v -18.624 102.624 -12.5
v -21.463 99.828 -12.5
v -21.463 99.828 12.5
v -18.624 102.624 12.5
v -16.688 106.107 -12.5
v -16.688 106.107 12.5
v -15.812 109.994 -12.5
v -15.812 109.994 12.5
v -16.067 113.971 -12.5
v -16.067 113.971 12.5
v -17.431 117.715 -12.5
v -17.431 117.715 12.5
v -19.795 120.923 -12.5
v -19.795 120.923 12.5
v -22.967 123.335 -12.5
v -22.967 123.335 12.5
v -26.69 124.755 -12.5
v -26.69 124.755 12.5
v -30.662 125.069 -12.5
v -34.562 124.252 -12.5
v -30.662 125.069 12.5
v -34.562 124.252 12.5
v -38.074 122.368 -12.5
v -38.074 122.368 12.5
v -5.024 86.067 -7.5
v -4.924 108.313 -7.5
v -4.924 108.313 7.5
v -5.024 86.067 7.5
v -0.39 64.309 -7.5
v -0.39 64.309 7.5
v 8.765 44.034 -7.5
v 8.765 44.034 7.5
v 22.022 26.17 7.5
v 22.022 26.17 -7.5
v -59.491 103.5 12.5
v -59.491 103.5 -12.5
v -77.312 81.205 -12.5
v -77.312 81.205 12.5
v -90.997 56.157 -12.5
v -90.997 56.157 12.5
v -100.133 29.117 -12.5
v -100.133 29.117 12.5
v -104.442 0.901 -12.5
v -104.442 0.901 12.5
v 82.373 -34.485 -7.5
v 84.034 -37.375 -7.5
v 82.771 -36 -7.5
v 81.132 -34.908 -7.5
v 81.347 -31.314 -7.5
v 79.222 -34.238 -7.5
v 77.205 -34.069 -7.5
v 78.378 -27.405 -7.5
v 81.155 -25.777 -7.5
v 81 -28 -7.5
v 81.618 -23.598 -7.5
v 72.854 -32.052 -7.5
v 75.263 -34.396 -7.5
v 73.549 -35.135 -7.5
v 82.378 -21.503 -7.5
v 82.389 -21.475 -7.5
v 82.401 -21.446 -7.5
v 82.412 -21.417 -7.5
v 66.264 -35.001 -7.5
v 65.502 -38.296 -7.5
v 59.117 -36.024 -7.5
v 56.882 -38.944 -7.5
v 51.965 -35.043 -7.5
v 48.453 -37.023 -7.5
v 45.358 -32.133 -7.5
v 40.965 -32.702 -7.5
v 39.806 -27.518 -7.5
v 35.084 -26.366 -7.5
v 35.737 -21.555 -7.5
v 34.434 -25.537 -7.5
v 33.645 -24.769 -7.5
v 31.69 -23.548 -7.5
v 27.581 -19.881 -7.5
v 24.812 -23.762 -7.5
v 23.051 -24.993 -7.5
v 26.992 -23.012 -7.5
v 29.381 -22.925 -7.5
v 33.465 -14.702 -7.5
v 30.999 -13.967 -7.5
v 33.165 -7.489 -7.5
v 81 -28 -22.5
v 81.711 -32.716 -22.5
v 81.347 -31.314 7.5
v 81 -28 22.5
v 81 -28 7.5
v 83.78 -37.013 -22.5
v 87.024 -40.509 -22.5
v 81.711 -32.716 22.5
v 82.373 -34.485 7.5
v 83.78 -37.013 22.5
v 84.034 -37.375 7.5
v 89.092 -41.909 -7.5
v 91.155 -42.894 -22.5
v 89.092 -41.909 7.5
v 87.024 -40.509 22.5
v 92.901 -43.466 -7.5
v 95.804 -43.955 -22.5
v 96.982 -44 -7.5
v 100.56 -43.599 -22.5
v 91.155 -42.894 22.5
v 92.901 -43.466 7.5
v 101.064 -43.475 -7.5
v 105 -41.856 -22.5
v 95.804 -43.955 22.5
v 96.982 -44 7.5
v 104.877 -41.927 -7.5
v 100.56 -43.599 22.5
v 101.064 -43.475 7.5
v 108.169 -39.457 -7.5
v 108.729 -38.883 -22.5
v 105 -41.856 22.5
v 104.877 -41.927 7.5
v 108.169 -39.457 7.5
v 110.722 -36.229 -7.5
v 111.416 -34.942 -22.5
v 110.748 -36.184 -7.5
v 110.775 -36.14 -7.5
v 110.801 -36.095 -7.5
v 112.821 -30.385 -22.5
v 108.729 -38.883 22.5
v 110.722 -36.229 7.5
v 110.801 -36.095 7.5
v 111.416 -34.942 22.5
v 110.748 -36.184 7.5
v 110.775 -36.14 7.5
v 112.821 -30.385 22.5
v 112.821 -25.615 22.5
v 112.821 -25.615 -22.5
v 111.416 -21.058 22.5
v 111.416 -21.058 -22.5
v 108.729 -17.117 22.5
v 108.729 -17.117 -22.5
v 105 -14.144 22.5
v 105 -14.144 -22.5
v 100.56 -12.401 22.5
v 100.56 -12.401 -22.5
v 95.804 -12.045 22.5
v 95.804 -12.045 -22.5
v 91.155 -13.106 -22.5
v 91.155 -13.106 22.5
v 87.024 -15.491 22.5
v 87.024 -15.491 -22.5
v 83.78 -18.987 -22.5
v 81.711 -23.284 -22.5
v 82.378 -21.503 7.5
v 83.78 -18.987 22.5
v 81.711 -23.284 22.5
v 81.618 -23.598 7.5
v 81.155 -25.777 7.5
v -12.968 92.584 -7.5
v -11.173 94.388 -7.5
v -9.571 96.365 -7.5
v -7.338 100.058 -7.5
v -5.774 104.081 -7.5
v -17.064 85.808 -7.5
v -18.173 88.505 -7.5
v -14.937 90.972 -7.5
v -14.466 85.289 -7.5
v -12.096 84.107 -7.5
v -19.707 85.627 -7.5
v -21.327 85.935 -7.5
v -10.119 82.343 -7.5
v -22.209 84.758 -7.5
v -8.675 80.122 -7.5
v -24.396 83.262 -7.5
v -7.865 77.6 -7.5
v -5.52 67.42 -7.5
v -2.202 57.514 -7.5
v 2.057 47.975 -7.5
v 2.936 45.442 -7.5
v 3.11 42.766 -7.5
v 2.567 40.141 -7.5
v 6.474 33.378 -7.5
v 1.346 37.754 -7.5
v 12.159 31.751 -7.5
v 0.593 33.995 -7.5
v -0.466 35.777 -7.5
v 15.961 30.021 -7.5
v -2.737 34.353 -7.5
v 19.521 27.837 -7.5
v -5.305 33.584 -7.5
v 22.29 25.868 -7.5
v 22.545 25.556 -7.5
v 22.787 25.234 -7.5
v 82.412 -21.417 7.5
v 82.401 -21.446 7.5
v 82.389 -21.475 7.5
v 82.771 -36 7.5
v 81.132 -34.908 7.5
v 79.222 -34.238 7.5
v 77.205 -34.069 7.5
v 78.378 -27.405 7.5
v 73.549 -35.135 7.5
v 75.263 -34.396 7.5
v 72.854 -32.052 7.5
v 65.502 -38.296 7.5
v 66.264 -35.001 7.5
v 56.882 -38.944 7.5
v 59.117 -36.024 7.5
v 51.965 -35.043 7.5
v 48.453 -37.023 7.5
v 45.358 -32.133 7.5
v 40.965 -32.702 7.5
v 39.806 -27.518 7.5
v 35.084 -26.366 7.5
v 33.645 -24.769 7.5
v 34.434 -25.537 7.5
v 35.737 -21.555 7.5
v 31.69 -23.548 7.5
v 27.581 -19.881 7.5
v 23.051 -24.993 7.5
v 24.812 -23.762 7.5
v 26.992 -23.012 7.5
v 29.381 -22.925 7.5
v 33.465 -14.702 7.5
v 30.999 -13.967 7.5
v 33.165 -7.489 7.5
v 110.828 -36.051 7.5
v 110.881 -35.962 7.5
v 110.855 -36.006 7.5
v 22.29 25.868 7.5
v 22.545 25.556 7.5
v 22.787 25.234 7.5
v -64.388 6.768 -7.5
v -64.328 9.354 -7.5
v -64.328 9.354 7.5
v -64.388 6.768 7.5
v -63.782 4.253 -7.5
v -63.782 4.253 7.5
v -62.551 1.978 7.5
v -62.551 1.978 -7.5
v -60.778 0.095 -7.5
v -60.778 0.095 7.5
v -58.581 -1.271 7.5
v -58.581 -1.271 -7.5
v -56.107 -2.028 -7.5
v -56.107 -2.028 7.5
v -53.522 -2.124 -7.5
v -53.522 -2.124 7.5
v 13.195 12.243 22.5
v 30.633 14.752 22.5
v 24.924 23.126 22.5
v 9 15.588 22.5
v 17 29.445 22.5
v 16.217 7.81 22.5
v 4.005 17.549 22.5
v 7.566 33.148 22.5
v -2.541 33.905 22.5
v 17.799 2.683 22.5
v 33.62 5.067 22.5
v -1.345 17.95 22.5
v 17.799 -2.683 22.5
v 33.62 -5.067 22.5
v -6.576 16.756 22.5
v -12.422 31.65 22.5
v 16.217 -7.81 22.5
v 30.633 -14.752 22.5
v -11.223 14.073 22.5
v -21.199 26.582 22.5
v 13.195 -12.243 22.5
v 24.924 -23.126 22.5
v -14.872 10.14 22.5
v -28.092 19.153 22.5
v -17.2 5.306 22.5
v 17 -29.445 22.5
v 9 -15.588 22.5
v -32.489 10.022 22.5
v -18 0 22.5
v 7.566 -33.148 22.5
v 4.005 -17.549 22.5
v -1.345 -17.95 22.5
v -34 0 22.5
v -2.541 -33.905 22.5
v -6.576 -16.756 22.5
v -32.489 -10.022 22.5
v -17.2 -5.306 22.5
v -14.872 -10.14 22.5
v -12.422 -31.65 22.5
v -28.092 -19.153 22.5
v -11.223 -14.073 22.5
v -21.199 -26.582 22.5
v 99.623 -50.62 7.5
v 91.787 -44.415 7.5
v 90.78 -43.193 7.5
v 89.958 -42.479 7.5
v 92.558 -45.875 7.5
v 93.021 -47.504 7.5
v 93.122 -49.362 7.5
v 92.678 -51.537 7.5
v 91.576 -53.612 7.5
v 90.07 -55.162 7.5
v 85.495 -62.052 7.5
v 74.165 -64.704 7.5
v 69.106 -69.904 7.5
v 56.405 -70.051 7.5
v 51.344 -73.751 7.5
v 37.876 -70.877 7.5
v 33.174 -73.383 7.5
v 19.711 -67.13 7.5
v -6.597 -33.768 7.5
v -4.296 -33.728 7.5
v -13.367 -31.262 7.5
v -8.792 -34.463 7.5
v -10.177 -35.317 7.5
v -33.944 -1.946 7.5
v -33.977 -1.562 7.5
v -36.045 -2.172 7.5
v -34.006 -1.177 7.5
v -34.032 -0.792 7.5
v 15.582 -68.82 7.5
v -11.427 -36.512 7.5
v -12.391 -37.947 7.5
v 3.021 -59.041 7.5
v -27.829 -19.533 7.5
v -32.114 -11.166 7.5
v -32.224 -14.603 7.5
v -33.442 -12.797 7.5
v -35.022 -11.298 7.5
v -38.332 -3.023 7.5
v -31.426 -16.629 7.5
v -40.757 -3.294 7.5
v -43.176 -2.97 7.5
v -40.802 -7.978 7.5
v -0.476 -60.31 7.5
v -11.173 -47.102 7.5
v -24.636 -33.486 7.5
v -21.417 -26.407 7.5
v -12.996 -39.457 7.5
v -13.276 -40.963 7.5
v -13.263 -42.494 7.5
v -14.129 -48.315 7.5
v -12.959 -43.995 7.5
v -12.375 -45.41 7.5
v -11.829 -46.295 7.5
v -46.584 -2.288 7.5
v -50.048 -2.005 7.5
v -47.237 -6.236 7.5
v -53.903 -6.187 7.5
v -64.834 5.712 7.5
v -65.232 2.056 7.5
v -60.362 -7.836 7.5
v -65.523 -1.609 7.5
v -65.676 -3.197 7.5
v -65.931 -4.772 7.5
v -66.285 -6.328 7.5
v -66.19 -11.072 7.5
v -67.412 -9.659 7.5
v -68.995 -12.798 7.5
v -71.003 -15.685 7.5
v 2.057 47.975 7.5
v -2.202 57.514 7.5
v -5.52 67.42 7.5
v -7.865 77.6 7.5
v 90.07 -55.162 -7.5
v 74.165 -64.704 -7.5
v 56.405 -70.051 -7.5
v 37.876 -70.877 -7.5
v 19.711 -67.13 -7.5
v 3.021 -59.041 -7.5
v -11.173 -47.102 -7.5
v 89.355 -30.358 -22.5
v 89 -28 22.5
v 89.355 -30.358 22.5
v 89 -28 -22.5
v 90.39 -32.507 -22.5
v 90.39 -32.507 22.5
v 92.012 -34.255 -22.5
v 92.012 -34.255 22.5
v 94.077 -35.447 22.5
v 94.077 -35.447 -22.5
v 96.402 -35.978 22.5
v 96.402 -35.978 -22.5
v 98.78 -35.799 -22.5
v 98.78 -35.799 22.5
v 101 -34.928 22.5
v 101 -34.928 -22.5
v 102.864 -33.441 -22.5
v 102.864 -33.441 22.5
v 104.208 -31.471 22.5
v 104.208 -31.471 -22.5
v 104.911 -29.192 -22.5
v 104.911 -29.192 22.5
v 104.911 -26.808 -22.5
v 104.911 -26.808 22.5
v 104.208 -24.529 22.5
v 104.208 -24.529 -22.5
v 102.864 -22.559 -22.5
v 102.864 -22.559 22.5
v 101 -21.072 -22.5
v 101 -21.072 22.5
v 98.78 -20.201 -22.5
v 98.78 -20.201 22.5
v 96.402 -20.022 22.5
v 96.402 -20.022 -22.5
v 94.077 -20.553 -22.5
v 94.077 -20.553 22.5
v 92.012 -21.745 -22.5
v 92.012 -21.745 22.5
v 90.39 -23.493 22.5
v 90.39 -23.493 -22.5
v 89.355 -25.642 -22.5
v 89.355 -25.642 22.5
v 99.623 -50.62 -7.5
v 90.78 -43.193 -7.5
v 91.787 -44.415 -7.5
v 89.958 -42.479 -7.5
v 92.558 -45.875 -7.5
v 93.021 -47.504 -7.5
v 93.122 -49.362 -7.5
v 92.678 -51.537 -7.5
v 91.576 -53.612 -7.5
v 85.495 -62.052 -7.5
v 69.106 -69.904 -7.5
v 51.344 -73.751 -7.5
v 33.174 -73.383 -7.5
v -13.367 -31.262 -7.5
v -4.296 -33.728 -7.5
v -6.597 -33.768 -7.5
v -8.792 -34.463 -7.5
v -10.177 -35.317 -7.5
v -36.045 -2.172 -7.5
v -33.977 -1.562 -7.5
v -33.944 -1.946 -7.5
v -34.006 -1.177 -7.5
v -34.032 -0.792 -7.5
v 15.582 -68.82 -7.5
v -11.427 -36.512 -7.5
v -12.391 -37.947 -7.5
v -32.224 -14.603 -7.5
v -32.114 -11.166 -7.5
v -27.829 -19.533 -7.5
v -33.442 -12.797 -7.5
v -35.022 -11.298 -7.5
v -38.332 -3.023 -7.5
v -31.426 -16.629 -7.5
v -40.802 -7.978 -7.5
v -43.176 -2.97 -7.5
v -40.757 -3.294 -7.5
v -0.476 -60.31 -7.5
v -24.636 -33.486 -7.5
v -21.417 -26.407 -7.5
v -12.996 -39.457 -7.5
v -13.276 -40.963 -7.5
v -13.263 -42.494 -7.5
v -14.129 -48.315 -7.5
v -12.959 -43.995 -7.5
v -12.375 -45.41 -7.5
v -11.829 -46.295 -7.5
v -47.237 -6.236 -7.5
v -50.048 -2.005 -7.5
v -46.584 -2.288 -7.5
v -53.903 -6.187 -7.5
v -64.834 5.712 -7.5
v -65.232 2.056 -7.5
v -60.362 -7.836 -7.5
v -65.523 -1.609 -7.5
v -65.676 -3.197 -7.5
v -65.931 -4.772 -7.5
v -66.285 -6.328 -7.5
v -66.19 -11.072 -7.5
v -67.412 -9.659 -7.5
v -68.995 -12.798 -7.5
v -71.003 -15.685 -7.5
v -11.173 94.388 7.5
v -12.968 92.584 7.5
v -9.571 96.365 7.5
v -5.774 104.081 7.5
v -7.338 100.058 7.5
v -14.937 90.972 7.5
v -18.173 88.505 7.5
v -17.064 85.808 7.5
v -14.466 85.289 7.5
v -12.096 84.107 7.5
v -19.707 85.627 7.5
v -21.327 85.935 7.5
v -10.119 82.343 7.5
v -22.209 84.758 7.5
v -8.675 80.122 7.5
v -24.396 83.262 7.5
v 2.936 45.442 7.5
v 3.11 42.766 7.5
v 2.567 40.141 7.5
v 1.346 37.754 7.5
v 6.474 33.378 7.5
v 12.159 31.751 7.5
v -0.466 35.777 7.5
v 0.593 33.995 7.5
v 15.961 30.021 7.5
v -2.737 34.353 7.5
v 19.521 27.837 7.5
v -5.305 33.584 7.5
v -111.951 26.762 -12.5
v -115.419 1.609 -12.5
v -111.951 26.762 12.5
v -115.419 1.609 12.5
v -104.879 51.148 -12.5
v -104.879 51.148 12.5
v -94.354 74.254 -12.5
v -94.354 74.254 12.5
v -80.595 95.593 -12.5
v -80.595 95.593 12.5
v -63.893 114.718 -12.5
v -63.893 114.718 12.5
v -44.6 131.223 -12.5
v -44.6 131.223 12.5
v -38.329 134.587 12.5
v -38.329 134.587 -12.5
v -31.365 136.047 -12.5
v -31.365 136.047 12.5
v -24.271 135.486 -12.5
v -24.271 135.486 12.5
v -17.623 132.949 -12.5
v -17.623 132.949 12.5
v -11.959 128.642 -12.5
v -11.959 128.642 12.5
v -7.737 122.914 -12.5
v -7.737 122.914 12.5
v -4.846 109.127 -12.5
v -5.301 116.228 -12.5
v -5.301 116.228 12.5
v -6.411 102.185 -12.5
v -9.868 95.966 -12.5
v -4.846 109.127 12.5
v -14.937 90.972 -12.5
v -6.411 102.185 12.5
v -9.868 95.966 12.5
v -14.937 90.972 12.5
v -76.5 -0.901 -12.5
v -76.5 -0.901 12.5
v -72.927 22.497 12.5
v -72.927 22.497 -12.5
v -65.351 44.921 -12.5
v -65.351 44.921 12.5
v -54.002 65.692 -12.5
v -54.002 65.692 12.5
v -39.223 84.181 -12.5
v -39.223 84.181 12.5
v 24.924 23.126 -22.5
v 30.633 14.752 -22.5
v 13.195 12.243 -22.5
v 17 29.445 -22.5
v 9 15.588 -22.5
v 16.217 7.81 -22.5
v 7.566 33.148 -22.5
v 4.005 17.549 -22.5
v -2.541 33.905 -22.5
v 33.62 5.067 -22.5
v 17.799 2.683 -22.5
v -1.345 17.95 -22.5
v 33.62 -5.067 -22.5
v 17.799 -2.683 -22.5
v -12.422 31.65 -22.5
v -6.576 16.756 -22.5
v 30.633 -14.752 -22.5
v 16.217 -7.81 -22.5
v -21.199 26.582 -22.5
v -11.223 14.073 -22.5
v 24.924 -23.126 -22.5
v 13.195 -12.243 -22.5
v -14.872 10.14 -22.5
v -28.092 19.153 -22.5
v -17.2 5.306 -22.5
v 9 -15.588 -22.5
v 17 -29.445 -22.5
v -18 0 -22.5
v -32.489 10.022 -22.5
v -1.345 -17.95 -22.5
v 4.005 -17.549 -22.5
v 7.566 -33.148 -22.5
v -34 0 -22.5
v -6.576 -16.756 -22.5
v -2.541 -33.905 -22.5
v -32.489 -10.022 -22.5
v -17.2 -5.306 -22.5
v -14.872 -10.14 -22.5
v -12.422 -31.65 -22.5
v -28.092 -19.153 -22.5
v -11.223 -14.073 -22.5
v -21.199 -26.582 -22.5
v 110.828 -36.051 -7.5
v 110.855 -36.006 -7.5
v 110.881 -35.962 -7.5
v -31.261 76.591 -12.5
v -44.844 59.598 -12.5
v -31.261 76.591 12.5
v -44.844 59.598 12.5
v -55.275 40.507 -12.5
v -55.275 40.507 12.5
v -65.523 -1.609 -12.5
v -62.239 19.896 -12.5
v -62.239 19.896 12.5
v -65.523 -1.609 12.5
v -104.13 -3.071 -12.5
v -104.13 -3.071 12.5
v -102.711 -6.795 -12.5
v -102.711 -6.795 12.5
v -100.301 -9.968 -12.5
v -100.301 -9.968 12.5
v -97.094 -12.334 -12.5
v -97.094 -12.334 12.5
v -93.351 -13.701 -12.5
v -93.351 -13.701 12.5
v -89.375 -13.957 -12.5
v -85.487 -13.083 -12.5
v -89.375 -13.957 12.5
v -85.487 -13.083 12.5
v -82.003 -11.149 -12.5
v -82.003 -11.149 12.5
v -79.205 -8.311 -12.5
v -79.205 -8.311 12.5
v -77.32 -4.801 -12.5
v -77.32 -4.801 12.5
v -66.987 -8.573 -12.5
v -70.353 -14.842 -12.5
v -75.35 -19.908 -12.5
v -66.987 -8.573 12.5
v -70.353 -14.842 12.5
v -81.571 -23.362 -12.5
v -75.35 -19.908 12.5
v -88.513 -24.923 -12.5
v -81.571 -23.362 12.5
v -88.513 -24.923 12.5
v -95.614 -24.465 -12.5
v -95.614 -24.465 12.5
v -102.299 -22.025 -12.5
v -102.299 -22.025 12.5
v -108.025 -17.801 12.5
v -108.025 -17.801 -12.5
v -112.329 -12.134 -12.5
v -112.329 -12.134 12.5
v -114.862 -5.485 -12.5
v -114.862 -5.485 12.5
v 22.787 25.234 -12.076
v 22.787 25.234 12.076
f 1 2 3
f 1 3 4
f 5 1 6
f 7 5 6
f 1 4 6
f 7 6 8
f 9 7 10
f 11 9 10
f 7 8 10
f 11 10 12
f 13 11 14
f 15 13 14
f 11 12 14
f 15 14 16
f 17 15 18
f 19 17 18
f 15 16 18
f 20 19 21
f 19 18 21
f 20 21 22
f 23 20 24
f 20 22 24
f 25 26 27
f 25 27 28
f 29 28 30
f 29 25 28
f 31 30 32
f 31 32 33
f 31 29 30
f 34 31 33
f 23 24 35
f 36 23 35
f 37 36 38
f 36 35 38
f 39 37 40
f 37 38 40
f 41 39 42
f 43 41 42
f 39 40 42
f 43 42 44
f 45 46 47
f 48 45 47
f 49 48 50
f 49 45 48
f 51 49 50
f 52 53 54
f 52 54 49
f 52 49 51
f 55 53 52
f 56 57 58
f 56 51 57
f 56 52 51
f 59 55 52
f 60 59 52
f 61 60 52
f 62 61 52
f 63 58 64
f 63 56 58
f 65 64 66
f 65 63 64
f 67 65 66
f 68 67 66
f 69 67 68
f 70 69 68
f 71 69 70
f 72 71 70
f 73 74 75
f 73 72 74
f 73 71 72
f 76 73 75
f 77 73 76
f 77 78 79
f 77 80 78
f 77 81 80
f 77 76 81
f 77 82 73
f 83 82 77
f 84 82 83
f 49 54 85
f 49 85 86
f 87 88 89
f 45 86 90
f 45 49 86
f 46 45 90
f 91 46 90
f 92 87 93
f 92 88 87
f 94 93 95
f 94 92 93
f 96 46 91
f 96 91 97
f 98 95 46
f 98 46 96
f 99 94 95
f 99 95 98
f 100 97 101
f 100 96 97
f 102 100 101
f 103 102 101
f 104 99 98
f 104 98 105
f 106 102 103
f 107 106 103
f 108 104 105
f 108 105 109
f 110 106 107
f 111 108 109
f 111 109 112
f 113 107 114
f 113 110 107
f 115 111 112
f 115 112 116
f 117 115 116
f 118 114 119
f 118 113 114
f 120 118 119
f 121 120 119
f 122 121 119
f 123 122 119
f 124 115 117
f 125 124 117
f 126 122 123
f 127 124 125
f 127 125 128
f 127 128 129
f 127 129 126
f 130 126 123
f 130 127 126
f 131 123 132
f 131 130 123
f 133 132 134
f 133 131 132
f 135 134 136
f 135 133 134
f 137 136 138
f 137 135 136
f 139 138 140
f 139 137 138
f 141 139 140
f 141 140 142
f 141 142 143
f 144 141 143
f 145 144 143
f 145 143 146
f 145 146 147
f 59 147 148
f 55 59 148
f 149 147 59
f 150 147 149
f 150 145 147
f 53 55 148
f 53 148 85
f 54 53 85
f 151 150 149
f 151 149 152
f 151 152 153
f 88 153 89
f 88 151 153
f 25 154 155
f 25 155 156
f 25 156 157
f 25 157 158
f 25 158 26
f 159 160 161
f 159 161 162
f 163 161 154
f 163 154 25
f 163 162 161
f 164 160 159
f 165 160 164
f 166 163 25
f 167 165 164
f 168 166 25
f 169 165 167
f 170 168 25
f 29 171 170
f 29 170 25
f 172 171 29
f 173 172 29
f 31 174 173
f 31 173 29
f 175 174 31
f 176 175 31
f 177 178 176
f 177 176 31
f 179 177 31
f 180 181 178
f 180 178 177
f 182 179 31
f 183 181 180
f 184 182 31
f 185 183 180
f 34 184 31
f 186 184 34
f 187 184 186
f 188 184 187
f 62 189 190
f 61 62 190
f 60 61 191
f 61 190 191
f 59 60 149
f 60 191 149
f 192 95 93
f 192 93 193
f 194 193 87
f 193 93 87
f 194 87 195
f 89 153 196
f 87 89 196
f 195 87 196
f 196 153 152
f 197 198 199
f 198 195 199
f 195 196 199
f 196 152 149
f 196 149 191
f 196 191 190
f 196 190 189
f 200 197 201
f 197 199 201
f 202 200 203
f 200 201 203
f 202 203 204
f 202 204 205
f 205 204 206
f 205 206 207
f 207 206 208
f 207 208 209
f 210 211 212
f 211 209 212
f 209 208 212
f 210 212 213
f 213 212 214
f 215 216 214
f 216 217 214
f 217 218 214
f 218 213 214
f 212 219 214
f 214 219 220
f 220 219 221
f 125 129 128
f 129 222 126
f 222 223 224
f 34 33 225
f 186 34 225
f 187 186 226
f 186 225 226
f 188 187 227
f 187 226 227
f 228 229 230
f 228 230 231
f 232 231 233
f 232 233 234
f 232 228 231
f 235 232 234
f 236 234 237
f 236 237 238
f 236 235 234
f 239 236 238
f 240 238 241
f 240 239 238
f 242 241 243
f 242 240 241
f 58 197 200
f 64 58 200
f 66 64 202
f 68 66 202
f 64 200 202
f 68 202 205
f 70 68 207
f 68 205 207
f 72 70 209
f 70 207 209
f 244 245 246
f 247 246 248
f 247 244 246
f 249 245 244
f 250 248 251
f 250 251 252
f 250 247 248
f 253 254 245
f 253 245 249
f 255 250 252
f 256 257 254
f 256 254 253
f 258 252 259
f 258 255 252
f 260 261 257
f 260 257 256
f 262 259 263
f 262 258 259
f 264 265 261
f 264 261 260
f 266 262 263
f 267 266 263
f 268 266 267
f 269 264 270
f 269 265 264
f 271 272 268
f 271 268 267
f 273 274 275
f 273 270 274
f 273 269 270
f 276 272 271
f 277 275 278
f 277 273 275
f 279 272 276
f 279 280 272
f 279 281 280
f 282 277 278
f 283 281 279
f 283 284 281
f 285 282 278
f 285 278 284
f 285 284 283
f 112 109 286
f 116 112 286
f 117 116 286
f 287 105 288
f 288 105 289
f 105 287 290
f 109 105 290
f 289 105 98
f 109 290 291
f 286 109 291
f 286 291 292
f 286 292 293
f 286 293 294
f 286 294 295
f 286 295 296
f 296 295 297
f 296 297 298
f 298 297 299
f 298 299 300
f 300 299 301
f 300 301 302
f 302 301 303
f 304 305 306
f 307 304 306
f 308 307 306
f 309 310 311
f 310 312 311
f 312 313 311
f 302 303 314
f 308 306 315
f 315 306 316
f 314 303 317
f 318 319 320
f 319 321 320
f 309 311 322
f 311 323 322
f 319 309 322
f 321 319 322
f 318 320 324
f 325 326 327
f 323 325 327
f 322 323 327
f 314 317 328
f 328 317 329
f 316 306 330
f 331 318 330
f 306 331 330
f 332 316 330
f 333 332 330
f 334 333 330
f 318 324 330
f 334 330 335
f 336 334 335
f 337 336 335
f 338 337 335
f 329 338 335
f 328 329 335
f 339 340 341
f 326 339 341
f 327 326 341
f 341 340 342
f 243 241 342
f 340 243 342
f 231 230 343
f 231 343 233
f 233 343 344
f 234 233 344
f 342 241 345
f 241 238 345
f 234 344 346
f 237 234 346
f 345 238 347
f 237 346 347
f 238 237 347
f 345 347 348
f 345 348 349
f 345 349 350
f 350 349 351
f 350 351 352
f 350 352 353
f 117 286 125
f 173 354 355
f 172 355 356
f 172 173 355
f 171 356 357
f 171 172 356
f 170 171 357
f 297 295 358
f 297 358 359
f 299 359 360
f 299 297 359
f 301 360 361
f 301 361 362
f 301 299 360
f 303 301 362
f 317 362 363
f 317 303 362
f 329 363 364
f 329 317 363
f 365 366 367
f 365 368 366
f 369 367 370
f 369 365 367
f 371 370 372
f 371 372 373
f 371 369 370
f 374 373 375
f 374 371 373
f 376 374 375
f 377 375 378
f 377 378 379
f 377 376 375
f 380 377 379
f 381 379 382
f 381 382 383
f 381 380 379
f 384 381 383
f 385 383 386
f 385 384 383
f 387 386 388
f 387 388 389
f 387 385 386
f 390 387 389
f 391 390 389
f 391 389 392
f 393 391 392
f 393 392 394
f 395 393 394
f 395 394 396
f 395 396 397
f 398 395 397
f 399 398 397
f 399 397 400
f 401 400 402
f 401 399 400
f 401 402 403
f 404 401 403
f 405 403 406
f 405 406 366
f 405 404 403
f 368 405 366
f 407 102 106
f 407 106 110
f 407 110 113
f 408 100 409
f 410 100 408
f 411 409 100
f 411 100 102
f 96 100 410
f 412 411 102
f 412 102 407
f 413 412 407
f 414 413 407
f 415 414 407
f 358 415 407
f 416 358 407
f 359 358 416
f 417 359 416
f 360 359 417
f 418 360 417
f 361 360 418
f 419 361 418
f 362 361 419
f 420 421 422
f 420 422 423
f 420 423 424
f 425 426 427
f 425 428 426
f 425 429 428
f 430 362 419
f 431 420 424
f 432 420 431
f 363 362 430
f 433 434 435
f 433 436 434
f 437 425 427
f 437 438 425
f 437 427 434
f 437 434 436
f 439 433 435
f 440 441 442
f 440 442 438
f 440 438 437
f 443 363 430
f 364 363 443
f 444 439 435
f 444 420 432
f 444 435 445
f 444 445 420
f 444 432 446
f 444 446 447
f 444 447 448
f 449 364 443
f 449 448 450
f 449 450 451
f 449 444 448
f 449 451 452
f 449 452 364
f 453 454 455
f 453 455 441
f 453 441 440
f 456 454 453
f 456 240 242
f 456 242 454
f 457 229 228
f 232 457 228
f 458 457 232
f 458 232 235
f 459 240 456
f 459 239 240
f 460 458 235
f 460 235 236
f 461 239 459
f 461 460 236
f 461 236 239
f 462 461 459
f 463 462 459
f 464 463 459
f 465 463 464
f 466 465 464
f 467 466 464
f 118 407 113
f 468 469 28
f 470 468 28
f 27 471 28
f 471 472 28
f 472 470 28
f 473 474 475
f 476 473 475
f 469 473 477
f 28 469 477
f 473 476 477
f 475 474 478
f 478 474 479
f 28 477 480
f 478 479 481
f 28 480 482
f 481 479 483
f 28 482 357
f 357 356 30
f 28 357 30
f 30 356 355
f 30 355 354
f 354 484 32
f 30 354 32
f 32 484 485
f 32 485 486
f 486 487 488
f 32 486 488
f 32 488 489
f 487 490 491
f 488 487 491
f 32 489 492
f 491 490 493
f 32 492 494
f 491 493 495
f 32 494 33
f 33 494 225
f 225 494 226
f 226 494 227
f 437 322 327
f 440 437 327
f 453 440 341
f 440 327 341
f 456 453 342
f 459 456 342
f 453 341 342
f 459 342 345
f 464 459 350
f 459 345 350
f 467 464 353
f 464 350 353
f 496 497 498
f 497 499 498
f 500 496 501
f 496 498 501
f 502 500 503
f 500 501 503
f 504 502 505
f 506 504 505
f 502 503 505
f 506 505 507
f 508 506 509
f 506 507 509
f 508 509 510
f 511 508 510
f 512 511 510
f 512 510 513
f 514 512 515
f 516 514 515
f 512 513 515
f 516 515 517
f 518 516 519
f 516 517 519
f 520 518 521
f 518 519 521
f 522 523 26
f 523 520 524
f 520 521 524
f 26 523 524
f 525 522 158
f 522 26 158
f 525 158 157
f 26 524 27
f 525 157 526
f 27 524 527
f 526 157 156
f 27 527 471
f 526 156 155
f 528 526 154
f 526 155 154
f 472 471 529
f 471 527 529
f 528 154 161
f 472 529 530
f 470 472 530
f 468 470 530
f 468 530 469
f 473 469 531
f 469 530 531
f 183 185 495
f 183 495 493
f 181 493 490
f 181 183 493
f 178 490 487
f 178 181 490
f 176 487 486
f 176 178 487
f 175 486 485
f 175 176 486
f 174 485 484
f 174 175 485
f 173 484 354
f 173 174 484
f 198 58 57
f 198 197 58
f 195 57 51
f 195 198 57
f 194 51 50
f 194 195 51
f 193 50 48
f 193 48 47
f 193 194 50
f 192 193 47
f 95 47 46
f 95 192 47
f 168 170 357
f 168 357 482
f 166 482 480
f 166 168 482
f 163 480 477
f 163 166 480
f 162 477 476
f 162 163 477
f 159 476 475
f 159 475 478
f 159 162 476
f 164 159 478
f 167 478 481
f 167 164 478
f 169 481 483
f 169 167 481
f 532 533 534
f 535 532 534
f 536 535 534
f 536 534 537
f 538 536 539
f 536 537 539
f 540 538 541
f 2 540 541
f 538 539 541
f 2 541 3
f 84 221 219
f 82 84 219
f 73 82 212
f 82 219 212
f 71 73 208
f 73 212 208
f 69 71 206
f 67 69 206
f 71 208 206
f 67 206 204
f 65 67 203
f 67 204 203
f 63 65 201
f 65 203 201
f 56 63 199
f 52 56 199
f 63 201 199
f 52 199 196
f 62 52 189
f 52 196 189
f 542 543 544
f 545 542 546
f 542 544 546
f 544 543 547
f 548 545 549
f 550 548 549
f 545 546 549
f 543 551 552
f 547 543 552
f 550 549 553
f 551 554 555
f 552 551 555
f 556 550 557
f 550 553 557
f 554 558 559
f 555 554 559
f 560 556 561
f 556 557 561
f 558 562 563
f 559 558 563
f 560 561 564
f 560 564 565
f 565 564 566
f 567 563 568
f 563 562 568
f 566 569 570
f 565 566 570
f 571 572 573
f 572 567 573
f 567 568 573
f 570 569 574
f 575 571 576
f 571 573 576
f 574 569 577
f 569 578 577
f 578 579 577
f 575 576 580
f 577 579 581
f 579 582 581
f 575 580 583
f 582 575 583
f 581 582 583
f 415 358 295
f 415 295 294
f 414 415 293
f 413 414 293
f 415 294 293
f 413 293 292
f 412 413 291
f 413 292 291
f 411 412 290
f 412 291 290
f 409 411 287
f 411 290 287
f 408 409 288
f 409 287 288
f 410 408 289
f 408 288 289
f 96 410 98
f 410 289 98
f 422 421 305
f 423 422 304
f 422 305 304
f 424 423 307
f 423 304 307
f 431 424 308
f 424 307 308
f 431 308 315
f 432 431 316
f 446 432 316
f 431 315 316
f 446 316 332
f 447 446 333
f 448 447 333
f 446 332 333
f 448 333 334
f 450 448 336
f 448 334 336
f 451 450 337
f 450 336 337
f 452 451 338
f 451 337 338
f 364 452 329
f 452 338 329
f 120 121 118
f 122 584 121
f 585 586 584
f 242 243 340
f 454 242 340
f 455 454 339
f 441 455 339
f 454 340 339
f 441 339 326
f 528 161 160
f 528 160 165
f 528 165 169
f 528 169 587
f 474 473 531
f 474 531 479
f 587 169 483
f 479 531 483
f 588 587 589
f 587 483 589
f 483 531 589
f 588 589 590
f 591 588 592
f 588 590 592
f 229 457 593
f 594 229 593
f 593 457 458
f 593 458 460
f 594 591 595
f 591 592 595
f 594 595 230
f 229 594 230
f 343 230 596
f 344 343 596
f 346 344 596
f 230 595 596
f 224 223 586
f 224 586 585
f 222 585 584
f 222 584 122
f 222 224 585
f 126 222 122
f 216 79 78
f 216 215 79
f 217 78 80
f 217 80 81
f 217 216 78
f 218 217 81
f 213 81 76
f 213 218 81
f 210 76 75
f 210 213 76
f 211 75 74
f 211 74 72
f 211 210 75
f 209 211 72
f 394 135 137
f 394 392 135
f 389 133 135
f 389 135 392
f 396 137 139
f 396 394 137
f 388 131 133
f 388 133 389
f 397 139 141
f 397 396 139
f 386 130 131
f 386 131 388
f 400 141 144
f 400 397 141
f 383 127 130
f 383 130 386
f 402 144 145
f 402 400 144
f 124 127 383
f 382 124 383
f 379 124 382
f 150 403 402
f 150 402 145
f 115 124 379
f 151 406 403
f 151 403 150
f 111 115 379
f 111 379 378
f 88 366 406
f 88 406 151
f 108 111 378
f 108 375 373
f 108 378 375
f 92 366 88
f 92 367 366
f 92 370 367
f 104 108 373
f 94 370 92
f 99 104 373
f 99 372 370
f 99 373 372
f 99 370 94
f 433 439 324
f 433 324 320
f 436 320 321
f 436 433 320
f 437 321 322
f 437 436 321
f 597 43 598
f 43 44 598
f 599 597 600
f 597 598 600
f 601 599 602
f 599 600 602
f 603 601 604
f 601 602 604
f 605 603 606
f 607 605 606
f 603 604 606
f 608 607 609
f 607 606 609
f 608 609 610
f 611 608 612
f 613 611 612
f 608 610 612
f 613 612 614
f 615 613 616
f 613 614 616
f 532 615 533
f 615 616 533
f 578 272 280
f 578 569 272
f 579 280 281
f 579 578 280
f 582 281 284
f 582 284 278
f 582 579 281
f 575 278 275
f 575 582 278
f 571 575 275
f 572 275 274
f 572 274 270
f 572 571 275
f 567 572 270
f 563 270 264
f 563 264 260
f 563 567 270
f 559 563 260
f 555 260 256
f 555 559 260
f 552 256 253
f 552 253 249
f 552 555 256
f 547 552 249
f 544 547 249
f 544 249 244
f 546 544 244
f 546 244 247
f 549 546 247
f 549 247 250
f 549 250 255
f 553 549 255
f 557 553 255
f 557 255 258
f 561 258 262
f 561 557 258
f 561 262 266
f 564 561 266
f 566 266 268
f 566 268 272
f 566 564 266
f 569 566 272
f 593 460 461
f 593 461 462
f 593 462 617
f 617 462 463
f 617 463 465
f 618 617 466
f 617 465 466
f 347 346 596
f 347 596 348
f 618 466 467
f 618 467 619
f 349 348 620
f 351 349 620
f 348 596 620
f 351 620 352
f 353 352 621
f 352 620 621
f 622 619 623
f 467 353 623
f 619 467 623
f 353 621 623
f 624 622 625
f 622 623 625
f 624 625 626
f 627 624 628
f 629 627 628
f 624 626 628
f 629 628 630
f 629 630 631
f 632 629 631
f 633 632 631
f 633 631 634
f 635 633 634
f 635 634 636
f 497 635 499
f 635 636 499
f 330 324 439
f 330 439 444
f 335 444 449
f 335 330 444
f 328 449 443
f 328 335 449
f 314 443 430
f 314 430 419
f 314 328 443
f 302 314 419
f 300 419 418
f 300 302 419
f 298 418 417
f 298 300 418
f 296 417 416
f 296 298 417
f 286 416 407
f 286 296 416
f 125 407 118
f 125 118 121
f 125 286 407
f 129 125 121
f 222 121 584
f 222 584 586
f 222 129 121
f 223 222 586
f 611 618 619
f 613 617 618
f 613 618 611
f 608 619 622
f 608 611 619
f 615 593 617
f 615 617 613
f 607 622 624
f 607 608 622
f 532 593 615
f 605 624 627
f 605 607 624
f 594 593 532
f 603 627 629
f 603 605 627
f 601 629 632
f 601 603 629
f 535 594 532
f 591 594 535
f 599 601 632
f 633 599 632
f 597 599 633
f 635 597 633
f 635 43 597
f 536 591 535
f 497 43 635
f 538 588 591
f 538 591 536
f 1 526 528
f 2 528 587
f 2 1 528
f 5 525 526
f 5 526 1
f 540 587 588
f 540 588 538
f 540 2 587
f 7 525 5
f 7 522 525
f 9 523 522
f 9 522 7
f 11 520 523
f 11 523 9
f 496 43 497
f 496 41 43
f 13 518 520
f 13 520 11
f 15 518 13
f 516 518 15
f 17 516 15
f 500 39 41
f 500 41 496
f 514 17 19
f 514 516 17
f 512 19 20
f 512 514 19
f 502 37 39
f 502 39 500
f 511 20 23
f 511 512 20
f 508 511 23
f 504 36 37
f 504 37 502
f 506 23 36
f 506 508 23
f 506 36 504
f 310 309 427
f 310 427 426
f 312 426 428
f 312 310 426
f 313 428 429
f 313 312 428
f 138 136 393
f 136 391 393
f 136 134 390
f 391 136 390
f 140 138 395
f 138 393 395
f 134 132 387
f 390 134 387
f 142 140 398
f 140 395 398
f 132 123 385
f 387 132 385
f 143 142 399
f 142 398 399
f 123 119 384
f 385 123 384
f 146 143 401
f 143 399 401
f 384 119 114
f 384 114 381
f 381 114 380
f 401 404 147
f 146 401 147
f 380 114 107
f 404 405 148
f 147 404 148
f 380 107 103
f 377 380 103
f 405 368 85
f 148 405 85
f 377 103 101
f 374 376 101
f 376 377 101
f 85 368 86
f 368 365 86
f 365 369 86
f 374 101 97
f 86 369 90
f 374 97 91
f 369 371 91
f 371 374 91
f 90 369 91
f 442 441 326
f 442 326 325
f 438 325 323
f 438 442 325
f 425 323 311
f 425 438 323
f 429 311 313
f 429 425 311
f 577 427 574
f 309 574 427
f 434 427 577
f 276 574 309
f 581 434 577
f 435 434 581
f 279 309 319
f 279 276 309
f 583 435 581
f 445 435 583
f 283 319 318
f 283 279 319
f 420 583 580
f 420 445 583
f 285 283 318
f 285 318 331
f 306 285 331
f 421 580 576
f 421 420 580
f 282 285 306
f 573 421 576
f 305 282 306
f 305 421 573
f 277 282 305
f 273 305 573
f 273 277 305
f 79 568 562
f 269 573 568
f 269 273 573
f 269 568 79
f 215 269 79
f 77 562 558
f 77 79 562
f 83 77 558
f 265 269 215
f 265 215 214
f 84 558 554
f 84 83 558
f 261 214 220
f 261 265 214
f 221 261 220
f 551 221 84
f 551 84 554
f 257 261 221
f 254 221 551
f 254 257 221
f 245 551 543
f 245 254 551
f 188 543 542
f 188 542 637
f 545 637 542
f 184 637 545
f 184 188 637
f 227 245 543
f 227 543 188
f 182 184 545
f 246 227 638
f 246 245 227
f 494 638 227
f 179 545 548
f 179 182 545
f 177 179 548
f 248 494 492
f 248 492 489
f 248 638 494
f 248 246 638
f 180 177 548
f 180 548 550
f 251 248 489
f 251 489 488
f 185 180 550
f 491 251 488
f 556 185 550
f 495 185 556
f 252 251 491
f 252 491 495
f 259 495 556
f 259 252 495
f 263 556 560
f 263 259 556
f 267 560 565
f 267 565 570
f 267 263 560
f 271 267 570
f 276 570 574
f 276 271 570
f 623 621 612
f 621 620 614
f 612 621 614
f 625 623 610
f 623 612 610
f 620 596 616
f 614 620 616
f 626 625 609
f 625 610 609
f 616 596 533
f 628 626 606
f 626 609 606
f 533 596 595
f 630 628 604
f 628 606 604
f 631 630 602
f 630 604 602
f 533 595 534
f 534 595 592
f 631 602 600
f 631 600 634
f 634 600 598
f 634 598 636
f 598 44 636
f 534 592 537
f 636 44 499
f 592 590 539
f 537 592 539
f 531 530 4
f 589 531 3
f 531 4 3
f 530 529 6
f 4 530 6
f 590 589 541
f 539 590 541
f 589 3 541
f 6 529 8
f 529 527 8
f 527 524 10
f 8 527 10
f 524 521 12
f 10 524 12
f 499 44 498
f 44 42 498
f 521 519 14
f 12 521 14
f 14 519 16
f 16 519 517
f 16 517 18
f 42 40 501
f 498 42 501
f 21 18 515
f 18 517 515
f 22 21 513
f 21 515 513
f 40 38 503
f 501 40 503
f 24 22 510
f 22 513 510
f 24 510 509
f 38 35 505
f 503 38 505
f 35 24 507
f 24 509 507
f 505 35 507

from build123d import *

# Parameters (mm, degrees)
SKETCH1_R            = 34
SKETCH1_R_2          = 18
BOSS_EXTRUDE1_DEPTH  = 22.5
SKETCH2_R            = 16
SKETCH2_R_2          = 8
BOSS_EXTRUDE2_DEPTH  = 22.5
BOSS_EXTRUDE4_DEPTH  = 7.5
BOSS_EXTRUDE5_DEPTH  = 7.5
BOSS_EXTRUDE13_DEPTH = 12.5
BOSS_EXTRUDE14_DEPTH = 7.5
FILLET14_R           = 10
FILLET16_R           = 8
FILLET17_R           = 8


with BuildPart() as part:
    # Sketch1 → Boss-Extrude1 (new, symmetric)
    with BuildSketch(Plane.XY):
        with Locations(Location((0, 0, 0), (0, 0, 180))):
            Circle(SKETCH1_R)
        with Locations(Location((0, 0, 0), (0, 0, 180))):
            Circle(SKETCH1_R_2, mode=Mode.SUBTRACT)
    extrude(amount=BOSS_EXTRUDE1_DEPTH, both=True)



with BuildPart() as body_2:
    # Sketch2 → Boss-Extrude2 (new, symmetric)
    with BuildSketch(Plane.XY):
        with Locations(Location((97, -28, 0), (0, 0, 180))):
            Circle(SKETCH2_R)
        with Locations(Location((97, -28, 0), (0, 0, 180))):
            Circle(SKETCH2_R_2, mode=Mode.SUBTRACT)
    extrude(amount=BOSS_EXTRUDE2_DEPTH, both=True)


with BuildPart() as part_1:
    add(part.part)

    add(body_2.part)  # Boss-Extrude4 merges body 2
    # Sketch4 → Boss-Extrude4 (add, symmetric)
    with BuildSketch(Plane.XY):
        with BuildLine():
            ThreePointArc((33.206005609, -7.1003724), (51.777283235, -34.98924979), (82.412015856, -21.417404229))
            ThreePointArc((82.412015856, -21.417404229), (81.371091146, -25.082275632), (81.074017469, -28.880505994))
            ThreePointArc((81.074017469, -28.880505994), (51.369473654, -37.991410417), (30.470988374, -14.999633287))
            ThreePointArc((30.470988374, -14.999633287), (32.120493939, -11.147640651), (33.206005609, -7.1003724))
        make_face()
    extrude(amount=BOSS_EXTRUDE4_DEPTH, both=True)

    # Sketch5 → Boss-Extrude5 (add, symmetric)
    with BuildSketch(Plane.XY):
        with BuildLine():
            ThreePointArc((-34.031526001, -0.792277944), (25.431977893, -71.913257024), (110.881269035, -35.961614448))
            ThreePointArc((110.881269035, -35.961614448), (107.27285681, -40.164612784), (102.451649001, -42.892577053))
            ThreePointArc((102.451649001, -42.892577053), (30.885190637, -69.988396494), (-27.207046107, -20.176415768))
            ThreePointArc((-27.207046107, -20.176415768), (-31.977671369, -10.96258702), (-34.031526001, -0.792277944))
        make_face()
    extrude(amount=BOSS_EXTRUDE5_DEPTH, both=True)



with BuildPart() as body_2_2:
    # Sketch8 → Boss-Extrude13 (new, symmetric)
    with BuildSketch(Plane.XY):
        with BuildLine():
            ThreePointArc((-14.937494573, 90.972331385), (-50.475974734, 50.279724458), (-65.522765853, -1.609252288))
            ThreePointArc((-65.522765853, -1.609252288), (-92.080170519, -24.948152378), (-115.419070609, 1.609252288))
            ThreePointArc((-115.419070609, 1.609252288), (-94.353563042, 74.253819732), (-44.599690817, 131.223469431))
            ThreePointArc((-44.599690817, 131.223469431), (-9.643023672, 125.92899853), (-14.937494573, 90.972331385))
        make_face()
        with BuildLine():
            ThreePointArc((-104.441883562, 0.901181281), (-91.372099512, -13.970965332), (-76.499952899, -0.901181281))
            ThreePointArc((-76.499952899, -0.901181281), (-60.129044162, 55.554025418), (-21.463177747, 99.827581755))
            ThreePointArc((-21.463177747, 99.827581755), (-18.498274042, 119.403315356), (-38.074007643, 122.368219061))
            ThreePointArc((-38.074007643, 122.368219061), (-84.700493614, 68.979518772), (-104.441883562, 0.901181281))
        make_face(mode=Mode.SUBTRACT)
    extrude(amount=BOSS_EXTRUDE13_DEPTH, both=True)


with BuildPart() as part_2:
    add(part_1.part)

    add(body_2_2.part)  # Boss-Extrude14 merges body 2 2
    # Sketch8<9> → Boss-Extrude14 (add, symmetric)
    with BuildSketch(Plane.XY):
        with BuildLine():
            ThreePointArc((-4.924235101, 108.312600467), (-0.101365505, 63.440523319), (23.275646022, 24.836395161))
            ThreePointArc((23.275646022, 24.836395161), (18.02581673, 28.582349539), (12.304584847, 31.558989848))
            ThreePointArc((12.304584847, 31.558989848), (-3.899104901, 62.184418871), (-9.571104645, 96.364894046))
            ThreePointArc((-9.571104645, 96.364894046), (-6.468831174, 102.035830387), (-4.924235101, 108.312600467))
        make_face()
        with BuildLine():
            ThreePointArc((-31.919461404, -14.075384629), (-51.826123505, -6.018423189), (-71.003100626, -15.684517133))
            ThreePointArc((-71.003100626, -15.684517133), (-68.148351126, -11.256242618), (-66.285052548, -6.32802506))
            ThreePointArc((-66.285052548, -6.32802506), (-49.617118255, -2.018061944), (-33.32443821, -7.580830374))
            ThreePointArc((-33.32443821, -7.580830374), (-32.713889809, -10.847997022), (-31.919461404, -14.075384629))
        make_face()
    extrude(amount=BOSS_EXTRUDE14_DEPTH, both=True)

    # Fillet14
    # the kernel refuses this fillet: 10 mm, written as the material it adds along each edge
    with BuildSketch(Plane(origin=(-9.571104645, 96.364894046, -7.5), x_dir=(-0.7492882116327264, -0.6622440455815594, 0), z_dir=(0, 0, 1))) as fillet14_piece_1:
        with BuildLine():
            CenterArc((19.69565471, 9.999601125), FILLET14_R, 148.729139323, 121.782610057)
            Line((11.148425358, 15.19044599), (10.293702423, 15.709530477))
            ThreePointArc((10.293702423, 15.709530477), (5.099940987, 7.943295893), (-0.751496774, 0.659736764))
            Line((-0.751496774, 0.659736764), (0.215075759, -0.976597367))
            ThreePointArc((0.215075759, -0.976597367), (7.503554375, -0.509342466), (19.793902231, -0.999960113))
            Line((19.793902231, -0.999960113), (19.784970638, 0))
        make_face()
    extrude(amount=15)
    with BuildSketch(Plane(origin=(12.159345053, 31.751383086, -7.5), x_dir=(-0.5285784325634836, 0.8488844683634699, 0), z_dir=(0, 0, 1))) as fillet14_piece_2:
        with BuildLine():
            CenterArc((19.996455315, 9.960779633), FILLET14_R, 157.06784833, 107.855989322)
            ThreePointArc((10.786786288, 13.857187776), (6.303465021, 6.220170866), (0, 0))
            ThreePointArc((0, 0), (9.555828204, 0.423579966), (19.111656407, 0))
        make_face()
    extrude(amount=15)
    with BuildSketch(Plane(origin=(-32.126211784, -13.860546046, -7.5), x_dir=(-0.7488822965541873, 0.6627030299521243, 0), z_dir=(0, 0, 1))) as fillet14_piece_3:
        with BuildLine():
            CenterArc((3.122942969, 9.972317771), FILLET14_R, 236.75546449, 37.508743658)
            ThreePointArc((-2.359191707, 1.608933325), (-1.172232304, 0.815263894), (0, 0))
            ThreePointArc((0, 0), (1.933250409, -0.071973796), (3.866500819, 0))
        make_face()
    extrude(amount=15)
    with BuildSketch(Plane(origin=(-33.32443821, -7.580830374, -7.5), x_dir=(-0.9057047717229613, 0.42390903089962434, 0), z_dir=(0, 0, 1))) as fillet14_piece_4:
        with BuildLine():
            CenterArc((12.689549677, -9.834316561), FILLET14_R, 100.444283177, 56.0673219)
            ThreePointArc((3.518141468, -5.84868343), (1.823073957, -2.885842043), (0, 0))
            ThreePointArc((0, 0), (5.438378433, -0.497050317), (10.876756866, 0))
        make_face()
    extrude(amount=15)
    with BuildSketch(Plane(origin=(-66.285052548, -6.32802506, -7.5), x_dir=(0.12382892083322194, 0.9923035817557446, 0), z_dir=(0, 0, 1))) as fillet14_piece_5:
        with BuildLine():
            CenterArc((15.518466833, -9.995933117), FILLET14_R, 88.36588285, 104.037213694)
            Line((5.751860117, -12.143814227), (4.775199446, -12.358602338))
            ThreePointArc((4.775199446, -12.358602338), (2.660832169, -6.173787211), (-0.784932001, -0.619581919))
            Line((-0.784932001, -0.619581919), (0.131376491, 0.991332546))
            ThreePointArc((0.131376491, 0.991332546), (4.717150823, 0.82611724), (15.832152273, 0.999593312))
            Line((15.832152273, 0.999593312), (15.803635414, 0))
        make_face()
    extrude(amount=15)
    # the kernel refuses this fillet: 10 mm, written as the material it takes off along each edge
    with BuildSketch(Plane(origin=(23.275646022, 24.836395161, 12.075662987), x_dir=(-0.775723763432973, 0.6310726129736459, 0), z_dir=(0, 0, -1))) as fillet14_2_piece_1:
        with BuildLine():
            CenterArc((3.231710715, -9.655465783), FILLET14_R, 98.150393055, 6.933334265)
            ThreePointArc((1.813991439, 0.243527704), (0.907531451, 0.117773287), (0, 0))
            ThreePointArc((0, 0), (0.314703895, 0.001074211), (0.62940779, 0))
        make_face()
    extrude(amount=24.151325973, mode=Mode.SUBTRACT)

    # Fillet16
    fillet16_edges = [part_2.edges().sort_by_distance(p)[0] for p in [
        (102.283564786, -43.10244825, 0),
        (-27.073199852, -20.567981178, 0),
    ]]
    fillet(fillet16_edges, radius=FILLET16_R)

    # Fillet17
    fillet17_edges = [part_2.edges().sort_by_distance(p)[0] for p in [
        (30.481870475, -15.06172541, 0),
        (81.027337873, -28.934914209, 0),
    ]]
    fillet(fillet17_edges, radius=FILLET17_R)


solid = part_2.part
